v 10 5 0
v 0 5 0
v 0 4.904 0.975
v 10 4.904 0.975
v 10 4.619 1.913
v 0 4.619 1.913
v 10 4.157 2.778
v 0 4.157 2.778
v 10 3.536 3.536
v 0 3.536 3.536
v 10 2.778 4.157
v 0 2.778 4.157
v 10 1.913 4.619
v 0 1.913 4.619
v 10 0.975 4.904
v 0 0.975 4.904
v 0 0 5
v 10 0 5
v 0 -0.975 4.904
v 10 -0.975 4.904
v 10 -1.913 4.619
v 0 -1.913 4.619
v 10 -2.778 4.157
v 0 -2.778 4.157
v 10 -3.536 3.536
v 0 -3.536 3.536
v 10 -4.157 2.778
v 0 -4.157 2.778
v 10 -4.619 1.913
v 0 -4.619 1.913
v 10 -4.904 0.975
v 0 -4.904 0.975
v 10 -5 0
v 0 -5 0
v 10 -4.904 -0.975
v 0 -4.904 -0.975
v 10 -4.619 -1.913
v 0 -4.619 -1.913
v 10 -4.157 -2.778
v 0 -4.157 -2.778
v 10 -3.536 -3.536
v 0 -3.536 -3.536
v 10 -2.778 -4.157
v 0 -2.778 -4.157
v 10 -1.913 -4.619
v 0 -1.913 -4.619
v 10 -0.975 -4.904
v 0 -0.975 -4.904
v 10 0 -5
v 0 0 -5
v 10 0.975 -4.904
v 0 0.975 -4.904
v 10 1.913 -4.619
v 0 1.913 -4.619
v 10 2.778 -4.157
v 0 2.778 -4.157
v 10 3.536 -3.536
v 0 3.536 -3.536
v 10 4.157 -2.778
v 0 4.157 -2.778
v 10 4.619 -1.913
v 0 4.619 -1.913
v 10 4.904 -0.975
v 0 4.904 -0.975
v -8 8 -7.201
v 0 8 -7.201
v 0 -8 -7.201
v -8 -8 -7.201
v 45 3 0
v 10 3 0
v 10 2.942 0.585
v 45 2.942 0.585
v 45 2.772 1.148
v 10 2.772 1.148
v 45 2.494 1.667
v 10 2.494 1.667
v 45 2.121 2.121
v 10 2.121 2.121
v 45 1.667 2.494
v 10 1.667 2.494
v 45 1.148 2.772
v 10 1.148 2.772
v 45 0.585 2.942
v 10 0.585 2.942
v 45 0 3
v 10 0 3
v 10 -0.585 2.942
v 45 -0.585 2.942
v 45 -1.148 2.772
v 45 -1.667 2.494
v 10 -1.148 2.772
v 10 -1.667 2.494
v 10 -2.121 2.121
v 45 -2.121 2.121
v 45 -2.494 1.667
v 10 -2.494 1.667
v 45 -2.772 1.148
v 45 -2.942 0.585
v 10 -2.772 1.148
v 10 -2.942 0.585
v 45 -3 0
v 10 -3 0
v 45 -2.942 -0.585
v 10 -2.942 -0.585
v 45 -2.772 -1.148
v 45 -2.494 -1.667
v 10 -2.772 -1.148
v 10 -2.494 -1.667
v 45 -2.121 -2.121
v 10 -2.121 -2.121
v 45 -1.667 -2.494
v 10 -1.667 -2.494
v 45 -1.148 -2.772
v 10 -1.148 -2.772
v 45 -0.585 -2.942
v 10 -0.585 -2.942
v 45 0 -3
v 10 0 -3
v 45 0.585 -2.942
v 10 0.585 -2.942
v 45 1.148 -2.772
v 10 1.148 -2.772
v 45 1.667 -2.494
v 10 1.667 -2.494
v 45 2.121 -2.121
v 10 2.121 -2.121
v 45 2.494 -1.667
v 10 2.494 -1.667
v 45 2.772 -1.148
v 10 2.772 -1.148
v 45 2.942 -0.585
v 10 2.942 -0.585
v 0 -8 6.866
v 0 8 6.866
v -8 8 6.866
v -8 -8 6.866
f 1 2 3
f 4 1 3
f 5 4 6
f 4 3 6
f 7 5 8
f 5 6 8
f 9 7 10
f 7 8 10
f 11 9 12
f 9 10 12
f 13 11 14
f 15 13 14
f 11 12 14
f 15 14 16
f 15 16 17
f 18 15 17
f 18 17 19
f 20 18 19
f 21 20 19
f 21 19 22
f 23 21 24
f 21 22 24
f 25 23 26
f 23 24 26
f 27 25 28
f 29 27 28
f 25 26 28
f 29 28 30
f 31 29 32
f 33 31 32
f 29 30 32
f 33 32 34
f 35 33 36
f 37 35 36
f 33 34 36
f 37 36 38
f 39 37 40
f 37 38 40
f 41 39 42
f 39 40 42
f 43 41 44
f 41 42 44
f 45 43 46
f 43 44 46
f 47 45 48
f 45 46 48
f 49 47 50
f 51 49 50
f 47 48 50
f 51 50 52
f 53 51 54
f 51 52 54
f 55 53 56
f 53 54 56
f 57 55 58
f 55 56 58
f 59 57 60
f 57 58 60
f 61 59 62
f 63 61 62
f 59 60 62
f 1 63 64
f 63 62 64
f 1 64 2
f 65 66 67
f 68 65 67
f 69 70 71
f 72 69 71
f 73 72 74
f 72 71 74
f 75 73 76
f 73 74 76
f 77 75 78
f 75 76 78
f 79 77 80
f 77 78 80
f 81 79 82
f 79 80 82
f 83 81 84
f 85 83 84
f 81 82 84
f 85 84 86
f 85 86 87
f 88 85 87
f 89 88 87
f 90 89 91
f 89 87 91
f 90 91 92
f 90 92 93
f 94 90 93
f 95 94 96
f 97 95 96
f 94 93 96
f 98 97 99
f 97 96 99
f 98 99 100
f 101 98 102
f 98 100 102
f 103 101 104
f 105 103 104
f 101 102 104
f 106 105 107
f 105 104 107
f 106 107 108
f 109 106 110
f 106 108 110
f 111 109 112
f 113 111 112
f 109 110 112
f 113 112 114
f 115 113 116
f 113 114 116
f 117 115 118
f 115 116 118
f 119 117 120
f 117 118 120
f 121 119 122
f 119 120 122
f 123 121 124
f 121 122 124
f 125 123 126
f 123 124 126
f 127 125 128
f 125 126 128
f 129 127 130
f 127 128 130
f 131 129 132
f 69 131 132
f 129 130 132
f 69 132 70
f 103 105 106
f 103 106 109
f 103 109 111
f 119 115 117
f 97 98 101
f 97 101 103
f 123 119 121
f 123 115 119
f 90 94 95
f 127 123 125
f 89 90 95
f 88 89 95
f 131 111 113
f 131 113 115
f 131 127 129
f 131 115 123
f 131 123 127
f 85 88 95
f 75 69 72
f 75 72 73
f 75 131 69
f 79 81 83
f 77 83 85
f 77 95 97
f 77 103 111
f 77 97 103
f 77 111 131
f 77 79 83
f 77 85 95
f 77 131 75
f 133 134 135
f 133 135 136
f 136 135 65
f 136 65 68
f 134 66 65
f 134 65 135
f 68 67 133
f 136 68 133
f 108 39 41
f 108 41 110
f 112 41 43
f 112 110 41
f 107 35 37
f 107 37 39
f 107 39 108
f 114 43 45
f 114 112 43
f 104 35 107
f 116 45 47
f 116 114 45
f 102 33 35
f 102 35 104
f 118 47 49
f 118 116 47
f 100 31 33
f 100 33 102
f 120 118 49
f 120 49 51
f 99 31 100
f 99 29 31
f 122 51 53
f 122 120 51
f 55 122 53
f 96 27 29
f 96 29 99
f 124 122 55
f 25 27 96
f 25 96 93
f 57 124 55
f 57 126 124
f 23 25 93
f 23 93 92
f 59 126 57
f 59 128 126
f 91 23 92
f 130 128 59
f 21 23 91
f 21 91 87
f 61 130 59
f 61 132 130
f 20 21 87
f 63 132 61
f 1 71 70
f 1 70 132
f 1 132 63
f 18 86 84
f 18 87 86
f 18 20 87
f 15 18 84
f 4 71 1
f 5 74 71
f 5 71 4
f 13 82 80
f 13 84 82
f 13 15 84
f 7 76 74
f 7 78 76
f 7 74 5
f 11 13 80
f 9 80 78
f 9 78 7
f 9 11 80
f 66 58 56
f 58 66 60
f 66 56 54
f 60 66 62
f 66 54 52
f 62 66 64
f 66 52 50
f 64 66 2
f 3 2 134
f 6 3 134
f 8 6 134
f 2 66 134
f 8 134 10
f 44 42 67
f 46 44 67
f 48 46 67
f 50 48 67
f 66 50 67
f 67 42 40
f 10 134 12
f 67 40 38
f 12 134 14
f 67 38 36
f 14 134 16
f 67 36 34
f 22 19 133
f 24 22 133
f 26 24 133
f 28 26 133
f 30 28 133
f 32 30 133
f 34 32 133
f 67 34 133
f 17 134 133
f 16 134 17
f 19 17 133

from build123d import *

# Parameters (mm, degrees)
F0_R     = 5
F1_DEPTH = 10
F2_R     = 3
F3_DEPTH = 35
F4_W     = 16
F4_H     = 14.067116
F5_DEPTH = 8


with BuildPart() as f1:
    # F0 (on Right) → F1 (new body)
    with BuildSketch(Plane.YZ):
        Circle(F0_R)
    extrude(amount=F1_DEPTH)

    # F2 (on face) → F3 (join)
    with BuildSketch(Plane.YZ.offset(10)):
        Circle(F2_R)
    extrude(amount=F3_DEPTH)

    # F4 (on face) → F5 (join)
    with BuildSketch(Plane(origin=(0, 0, 0), x_dir=(0, -1, 0), z_dir=(-1, 0, 0))):
        with Locations((0, -0.167443)):
            Rectangle(F4_W, F4_H)
    extrude(amount=F5_DEPTH)


solid = f1.part
